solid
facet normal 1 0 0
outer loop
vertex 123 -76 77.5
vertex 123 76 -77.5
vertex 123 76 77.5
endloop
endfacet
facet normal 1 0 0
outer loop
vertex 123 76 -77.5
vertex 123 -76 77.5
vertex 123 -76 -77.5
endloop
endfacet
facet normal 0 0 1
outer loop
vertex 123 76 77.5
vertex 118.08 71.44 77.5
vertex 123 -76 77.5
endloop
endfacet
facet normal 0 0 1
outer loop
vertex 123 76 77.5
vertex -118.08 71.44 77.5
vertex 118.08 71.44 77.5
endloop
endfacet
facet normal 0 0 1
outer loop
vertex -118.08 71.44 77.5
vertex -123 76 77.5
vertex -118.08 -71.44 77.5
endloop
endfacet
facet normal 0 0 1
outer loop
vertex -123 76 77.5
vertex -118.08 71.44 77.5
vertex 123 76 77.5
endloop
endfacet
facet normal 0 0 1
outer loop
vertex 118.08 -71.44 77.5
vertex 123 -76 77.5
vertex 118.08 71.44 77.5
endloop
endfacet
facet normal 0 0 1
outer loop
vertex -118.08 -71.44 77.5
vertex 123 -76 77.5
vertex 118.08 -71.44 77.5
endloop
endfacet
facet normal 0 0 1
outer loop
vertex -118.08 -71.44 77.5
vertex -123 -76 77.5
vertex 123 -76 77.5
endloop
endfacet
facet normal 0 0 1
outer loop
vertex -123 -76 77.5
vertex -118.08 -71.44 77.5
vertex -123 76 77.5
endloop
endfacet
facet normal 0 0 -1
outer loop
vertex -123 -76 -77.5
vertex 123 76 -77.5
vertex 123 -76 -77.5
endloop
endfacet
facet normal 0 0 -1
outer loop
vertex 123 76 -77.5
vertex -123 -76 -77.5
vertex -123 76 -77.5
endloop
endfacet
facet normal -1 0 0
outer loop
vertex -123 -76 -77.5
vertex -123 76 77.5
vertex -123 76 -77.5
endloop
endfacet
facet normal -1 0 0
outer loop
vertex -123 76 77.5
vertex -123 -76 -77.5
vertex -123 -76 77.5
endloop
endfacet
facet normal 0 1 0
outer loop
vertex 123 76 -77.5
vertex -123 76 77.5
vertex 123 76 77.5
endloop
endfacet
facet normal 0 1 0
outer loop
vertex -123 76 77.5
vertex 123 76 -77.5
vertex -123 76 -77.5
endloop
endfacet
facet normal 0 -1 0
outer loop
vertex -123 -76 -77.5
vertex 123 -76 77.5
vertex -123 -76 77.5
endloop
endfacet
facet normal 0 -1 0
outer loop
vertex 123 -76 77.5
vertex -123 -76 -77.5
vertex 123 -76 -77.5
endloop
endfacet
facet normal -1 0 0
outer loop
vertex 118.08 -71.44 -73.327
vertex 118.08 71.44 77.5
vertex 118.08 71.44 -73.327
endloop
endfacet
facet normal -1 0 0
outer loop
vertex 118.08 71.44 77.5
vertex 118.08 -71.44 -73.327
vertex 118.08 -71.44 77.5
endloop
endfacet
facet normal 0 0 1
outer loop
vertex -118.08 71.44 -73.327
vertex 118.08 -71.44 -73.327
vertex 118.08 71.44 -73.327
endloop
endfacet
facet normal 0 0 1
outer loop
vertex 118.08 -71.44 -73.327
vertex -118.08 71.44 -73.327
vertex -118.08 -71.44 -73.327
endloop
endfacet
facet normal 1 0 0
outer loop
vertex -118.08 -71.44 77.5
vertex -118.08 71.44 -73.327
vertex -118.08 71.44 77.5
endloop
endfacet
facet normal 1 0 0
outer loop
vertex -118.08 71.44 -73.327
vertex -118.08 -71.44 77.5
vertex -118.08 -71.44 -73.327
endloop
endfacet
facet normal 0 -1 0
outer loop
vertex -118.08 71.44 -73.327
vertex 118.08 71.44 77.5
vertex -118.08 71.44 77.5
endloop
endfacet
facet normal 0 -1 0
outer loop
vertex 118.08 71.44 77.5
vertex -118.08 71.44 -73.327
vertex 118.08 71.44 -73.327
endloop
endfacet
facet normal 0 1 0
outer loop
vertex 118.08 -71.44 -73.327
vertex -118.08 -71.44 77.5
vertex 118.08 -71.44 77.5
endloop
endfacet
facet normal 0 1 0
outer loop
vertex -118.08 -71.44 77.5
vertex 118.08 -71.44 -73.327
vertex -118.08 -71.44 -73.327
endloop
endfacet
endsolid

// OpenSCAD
// file: 3dprinter.scad
//===============================================//
//===============================================//
//     BioDeploy SCAD file = 3dprinter.scad      //
//                 Start File                    //
//===============================================//
//===============================================//
//choose the max specs for your 3d printer
//here we use a replicator2x specs
x_print_max = 24.6*10;
y_print_max = 15.2*10;
z_print_max = 15.5*10;
//don't forget *10 to put unit in centimeters
//-----------------------------------------------//
//===============================================//
//===============================================//
//     BioDeploy SCAD file = 3dprinter.scad      //
//                   End  File                   //
//===============================================//
//===============================================//
// file: hydrolyseur_box.scad
//===============================================//
//===============================================//
//  BioDeploy SCAD file = hydrolyseur_box.scad   //
//                 Start File                    //
//===============================================//
//===============================================//
//-----------------------------------------------//

//===============================================//
//                   variables                   //
//===============================================//
include <hydrolyseur_variables.scad>
//===============================================//
//               Calls for use                   //
//===============================================//
//use <hydrolyseur_logo.scad>
//===============================================//
//                    Trees                      //
//===============================================//
module box()
{
  difference()
	{
	cube([x_h2o_box_ext,y_h2o_box_ext,z_h2o_box_ext], center = true);

	translate([0,0,z_h2o_box_int_move]) cube([x_h2o_box_int_difference,y_h2o_box_int_difference,z_h2o_box_int_difference], center = true);
	}}
box();


//%cube([x_h2o_cont_ext,y_h2o_cont_ext,z_h2o_cont_ext], center=true);
//-----------------------------------------------//
//===============================================//
//===============================================//
//  BioDeploy SCAD file = hydrolyseur_box.scad   //
//                   End  File                   //
//===============================================//
//===============================================//
// main file
//===============================================//
//===============================================//
//BioDeploy SCAD file = viewer_hydrolyseur_box.scad//
//                 Start File                    //
//===============================================//
//===============================================//
//-----------------------------------------------//

//===============================================//
//                   variables                   //
//===============================================//
include <hydrolyseur_box.scad>
//===============================================//
//               Calls for use                   //
//===============================================//

//===============================================//
//                    Trees                      //
//===============================================//

//-----------------------------------------------//
//===============================================//
//===============================================//
//BioDeploy SCAD file = viewer_hydrolyseur_box.scad//
//                   End  File                   //
//===============================================//
//===============================================//
